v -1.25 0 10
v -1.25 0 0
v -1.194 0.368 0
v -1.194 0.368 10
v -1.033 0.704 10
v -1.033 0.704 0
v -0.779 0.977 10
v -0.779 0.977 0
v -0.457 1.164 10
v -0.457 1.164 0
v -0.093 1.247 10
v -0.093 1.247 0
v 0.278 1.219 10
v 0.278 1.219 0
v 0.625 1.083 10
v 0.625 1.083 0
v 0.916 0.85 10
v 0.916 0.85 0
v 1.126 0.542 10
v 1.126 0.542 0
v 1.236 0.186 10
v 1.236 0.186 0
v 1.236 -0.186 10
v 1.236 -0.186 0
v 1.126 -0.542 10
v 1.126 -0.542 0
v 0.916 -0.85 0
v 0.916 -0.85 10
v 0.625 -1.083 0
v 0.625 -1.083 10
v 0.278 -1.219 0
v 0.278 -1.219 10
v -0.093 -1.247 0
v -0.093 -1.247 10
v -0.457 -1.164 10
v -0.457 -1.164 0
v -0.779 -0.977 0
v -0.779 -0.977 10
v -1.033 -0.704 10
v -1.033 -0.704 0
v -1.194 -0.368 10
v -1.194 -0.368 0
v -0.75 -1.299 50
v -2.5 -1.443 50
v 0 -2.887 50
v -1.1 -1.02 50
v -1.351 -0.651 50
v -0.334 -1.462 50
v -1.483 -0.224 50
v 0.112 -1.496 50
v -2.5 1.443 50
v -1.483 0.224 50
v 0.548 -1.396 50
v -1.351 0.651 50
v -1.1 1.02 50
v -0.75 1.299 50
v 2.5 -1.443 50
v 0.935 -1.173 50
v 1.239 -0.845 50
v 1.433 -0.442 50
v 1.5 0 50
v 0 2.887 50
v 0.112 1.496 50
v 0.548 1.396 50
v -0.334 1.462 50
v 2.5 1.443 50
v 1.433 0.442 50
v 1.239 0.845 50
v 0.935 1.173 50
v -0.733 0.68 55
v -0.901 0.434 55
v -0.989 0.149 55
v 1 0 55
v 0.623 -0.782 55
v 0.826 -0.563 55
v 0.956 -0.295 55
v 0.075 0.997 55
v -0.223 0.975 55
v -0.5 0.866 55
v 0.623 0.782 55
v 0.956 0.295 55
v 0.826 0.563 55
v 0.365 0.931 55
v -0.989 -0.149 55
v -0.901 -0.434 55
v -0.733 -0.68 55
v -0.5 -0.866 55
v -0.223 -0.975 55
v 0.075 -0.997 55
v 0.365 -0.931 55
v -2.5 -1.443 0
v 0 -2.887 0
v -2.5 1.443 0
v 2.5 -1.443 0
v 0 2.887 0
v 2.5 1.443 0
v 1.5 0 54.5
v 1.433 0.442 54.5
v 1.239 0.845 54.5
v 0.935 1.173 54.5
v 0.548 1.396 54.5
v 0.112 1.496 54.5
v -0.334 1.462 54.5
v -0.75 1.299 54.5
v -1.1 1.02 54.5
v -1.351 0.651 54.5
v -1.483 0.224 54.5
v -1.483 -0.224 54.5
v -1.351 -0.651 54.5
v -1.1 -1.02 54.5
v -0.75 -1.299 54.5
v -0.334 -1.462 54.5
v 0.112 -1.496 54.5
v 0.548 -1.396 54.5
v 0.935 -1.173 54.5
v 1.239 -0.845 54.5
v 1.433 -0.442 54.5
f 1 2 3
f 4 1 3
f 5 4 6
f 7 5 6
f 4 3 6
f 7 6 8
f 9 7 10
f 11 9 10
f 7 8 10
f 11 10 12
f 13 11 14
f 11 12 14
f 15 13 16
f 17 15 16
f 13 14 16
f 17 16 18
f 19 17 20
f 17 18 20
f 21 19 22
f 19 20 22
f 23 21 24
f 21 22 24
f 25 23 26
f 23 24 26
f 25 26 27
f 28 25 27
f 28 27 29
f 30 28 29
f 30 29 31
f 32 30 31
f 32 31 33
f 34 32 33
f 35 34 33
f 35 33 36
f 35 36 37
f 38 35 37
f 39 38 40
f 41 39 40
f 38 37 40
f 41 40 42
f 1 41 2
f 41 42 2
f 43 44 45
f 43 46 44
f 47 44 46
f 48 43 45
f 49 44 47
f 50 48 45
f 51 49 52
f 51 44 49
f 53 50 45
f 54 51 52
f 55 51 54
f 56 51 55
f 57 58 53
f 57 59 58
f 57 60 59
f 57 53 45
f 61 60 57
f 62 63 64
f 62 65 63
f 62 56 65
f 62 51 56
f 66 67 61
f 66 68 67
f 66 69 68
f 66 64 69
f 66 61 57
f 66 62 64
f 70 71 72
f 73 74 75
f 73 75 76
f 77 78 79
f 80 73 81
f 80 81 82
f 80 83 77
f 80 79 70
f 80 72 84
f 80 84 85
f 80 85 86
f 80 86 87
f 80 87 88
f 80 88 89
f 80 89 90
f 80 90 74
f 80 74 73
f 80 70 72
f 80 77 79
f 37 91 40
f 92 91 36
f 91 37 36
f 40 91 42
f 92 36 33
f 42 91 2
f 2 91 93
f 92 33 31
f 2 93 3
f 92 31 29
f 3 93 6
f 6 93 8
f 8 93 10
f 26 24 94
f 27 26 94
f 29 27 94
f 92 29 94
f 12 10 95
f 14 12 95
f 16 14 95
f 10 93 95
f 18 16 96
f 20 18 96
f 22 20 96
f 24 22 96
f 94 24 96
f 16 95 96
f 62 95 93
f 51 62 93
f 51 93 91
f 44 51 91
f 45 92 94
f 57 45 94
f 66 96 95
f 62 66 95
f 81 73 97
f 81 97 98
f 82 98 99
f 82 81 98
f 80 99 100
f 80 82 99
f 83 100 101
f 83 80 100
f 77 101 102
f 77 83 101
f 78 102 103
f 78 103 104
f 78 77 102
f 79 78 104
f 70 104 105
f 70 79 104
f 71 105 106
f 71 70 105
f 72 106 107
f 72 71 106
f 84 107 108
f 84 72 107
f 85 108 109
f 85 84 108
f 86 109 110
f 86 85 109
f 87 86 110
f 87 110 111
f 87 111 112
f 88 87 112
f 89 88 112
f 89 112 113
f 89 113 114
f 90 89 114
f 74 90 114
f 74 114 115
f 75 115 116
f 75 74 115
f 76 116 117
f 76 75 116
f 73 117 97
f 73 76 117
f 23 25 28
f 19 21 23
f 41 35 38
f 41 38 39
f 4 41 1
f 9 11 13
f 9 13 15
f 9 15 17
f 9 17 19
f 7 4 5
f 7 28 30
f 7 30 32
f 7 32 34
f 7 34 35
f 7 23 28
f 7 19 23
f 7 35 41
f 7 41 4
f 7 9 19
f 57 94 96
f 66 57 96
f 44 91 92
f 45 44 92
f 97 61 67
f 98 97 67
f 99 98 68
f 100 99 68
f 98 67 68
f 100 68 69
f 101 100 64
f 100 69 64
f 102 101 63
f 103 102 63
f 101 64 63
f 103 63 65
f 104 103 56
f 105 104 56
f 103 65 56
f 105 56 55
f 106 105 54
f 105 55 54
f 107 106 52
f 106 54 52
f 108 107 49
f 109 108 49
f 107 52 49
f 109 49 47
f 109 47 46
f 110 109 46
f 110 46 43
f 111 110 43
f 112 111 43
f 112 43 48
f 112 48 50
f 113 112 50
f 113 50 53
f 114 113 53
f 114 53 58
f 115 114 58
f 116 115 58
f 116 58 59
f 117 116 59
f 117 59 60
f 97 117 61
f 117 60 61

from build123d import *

# Parameters (mm, degrees)
BOSS_EXTRU_1_DEPTH      = 50
ESQUISSE2_R             = 1.5
BOSS_EXTRU_2_DEPTH      = 5
ESQUISSE3_R             = 1.25
ENL_V_MAT_EXTRU_1_DEPTH = 10
CHANFREIN1_SIZE         = 0.5


with BuildPart() as part:
    # Esquisse1 → Boss.-Extru.1 (new body)
    with BuildSketch(Plane.XY):
        Polygon((2.5, -1.443375673), (2.5, 1.443375673), (0, 2.886751346), (-2.5, 1.443375673), (-2.5, -1.443375673), (0, -2.886751346), align=None)
    extrude(amount=BOSS_EXTRU_1_DEPTH)

    # Esquisse2 → Boss.-Extru.2 (add)
    with BuildSketch(Plane.XY.offset(50)):
        Circle(ESQUISSE2_R)
    extrude(amount=BOSS_EXTRU_2_DEPTH)

    # Esquisse3 → Enlèv. mat.-Extru.1 (cut)
    with BuildSketch(Plane(origin=(0, 0, 0), x_dir=(-1, 0, 0), z_dir=(0, 0, -1))):
        Circle(ESQUISSE3_R)
    extrude(amount=-ENL_V_MAT_EXTRU_1_DEPTH, mode=Mode.SUBTRACT)

    # Chanfrein1
    chanfrein1_edges = [part.edges().sort_by_distance(p)[0] for p in [
        (-1.5, 0, 55),
    ]]
    chamfer(chanfrein1_edges, length=CHANFREIN1_SIZE)


solid = part.part
